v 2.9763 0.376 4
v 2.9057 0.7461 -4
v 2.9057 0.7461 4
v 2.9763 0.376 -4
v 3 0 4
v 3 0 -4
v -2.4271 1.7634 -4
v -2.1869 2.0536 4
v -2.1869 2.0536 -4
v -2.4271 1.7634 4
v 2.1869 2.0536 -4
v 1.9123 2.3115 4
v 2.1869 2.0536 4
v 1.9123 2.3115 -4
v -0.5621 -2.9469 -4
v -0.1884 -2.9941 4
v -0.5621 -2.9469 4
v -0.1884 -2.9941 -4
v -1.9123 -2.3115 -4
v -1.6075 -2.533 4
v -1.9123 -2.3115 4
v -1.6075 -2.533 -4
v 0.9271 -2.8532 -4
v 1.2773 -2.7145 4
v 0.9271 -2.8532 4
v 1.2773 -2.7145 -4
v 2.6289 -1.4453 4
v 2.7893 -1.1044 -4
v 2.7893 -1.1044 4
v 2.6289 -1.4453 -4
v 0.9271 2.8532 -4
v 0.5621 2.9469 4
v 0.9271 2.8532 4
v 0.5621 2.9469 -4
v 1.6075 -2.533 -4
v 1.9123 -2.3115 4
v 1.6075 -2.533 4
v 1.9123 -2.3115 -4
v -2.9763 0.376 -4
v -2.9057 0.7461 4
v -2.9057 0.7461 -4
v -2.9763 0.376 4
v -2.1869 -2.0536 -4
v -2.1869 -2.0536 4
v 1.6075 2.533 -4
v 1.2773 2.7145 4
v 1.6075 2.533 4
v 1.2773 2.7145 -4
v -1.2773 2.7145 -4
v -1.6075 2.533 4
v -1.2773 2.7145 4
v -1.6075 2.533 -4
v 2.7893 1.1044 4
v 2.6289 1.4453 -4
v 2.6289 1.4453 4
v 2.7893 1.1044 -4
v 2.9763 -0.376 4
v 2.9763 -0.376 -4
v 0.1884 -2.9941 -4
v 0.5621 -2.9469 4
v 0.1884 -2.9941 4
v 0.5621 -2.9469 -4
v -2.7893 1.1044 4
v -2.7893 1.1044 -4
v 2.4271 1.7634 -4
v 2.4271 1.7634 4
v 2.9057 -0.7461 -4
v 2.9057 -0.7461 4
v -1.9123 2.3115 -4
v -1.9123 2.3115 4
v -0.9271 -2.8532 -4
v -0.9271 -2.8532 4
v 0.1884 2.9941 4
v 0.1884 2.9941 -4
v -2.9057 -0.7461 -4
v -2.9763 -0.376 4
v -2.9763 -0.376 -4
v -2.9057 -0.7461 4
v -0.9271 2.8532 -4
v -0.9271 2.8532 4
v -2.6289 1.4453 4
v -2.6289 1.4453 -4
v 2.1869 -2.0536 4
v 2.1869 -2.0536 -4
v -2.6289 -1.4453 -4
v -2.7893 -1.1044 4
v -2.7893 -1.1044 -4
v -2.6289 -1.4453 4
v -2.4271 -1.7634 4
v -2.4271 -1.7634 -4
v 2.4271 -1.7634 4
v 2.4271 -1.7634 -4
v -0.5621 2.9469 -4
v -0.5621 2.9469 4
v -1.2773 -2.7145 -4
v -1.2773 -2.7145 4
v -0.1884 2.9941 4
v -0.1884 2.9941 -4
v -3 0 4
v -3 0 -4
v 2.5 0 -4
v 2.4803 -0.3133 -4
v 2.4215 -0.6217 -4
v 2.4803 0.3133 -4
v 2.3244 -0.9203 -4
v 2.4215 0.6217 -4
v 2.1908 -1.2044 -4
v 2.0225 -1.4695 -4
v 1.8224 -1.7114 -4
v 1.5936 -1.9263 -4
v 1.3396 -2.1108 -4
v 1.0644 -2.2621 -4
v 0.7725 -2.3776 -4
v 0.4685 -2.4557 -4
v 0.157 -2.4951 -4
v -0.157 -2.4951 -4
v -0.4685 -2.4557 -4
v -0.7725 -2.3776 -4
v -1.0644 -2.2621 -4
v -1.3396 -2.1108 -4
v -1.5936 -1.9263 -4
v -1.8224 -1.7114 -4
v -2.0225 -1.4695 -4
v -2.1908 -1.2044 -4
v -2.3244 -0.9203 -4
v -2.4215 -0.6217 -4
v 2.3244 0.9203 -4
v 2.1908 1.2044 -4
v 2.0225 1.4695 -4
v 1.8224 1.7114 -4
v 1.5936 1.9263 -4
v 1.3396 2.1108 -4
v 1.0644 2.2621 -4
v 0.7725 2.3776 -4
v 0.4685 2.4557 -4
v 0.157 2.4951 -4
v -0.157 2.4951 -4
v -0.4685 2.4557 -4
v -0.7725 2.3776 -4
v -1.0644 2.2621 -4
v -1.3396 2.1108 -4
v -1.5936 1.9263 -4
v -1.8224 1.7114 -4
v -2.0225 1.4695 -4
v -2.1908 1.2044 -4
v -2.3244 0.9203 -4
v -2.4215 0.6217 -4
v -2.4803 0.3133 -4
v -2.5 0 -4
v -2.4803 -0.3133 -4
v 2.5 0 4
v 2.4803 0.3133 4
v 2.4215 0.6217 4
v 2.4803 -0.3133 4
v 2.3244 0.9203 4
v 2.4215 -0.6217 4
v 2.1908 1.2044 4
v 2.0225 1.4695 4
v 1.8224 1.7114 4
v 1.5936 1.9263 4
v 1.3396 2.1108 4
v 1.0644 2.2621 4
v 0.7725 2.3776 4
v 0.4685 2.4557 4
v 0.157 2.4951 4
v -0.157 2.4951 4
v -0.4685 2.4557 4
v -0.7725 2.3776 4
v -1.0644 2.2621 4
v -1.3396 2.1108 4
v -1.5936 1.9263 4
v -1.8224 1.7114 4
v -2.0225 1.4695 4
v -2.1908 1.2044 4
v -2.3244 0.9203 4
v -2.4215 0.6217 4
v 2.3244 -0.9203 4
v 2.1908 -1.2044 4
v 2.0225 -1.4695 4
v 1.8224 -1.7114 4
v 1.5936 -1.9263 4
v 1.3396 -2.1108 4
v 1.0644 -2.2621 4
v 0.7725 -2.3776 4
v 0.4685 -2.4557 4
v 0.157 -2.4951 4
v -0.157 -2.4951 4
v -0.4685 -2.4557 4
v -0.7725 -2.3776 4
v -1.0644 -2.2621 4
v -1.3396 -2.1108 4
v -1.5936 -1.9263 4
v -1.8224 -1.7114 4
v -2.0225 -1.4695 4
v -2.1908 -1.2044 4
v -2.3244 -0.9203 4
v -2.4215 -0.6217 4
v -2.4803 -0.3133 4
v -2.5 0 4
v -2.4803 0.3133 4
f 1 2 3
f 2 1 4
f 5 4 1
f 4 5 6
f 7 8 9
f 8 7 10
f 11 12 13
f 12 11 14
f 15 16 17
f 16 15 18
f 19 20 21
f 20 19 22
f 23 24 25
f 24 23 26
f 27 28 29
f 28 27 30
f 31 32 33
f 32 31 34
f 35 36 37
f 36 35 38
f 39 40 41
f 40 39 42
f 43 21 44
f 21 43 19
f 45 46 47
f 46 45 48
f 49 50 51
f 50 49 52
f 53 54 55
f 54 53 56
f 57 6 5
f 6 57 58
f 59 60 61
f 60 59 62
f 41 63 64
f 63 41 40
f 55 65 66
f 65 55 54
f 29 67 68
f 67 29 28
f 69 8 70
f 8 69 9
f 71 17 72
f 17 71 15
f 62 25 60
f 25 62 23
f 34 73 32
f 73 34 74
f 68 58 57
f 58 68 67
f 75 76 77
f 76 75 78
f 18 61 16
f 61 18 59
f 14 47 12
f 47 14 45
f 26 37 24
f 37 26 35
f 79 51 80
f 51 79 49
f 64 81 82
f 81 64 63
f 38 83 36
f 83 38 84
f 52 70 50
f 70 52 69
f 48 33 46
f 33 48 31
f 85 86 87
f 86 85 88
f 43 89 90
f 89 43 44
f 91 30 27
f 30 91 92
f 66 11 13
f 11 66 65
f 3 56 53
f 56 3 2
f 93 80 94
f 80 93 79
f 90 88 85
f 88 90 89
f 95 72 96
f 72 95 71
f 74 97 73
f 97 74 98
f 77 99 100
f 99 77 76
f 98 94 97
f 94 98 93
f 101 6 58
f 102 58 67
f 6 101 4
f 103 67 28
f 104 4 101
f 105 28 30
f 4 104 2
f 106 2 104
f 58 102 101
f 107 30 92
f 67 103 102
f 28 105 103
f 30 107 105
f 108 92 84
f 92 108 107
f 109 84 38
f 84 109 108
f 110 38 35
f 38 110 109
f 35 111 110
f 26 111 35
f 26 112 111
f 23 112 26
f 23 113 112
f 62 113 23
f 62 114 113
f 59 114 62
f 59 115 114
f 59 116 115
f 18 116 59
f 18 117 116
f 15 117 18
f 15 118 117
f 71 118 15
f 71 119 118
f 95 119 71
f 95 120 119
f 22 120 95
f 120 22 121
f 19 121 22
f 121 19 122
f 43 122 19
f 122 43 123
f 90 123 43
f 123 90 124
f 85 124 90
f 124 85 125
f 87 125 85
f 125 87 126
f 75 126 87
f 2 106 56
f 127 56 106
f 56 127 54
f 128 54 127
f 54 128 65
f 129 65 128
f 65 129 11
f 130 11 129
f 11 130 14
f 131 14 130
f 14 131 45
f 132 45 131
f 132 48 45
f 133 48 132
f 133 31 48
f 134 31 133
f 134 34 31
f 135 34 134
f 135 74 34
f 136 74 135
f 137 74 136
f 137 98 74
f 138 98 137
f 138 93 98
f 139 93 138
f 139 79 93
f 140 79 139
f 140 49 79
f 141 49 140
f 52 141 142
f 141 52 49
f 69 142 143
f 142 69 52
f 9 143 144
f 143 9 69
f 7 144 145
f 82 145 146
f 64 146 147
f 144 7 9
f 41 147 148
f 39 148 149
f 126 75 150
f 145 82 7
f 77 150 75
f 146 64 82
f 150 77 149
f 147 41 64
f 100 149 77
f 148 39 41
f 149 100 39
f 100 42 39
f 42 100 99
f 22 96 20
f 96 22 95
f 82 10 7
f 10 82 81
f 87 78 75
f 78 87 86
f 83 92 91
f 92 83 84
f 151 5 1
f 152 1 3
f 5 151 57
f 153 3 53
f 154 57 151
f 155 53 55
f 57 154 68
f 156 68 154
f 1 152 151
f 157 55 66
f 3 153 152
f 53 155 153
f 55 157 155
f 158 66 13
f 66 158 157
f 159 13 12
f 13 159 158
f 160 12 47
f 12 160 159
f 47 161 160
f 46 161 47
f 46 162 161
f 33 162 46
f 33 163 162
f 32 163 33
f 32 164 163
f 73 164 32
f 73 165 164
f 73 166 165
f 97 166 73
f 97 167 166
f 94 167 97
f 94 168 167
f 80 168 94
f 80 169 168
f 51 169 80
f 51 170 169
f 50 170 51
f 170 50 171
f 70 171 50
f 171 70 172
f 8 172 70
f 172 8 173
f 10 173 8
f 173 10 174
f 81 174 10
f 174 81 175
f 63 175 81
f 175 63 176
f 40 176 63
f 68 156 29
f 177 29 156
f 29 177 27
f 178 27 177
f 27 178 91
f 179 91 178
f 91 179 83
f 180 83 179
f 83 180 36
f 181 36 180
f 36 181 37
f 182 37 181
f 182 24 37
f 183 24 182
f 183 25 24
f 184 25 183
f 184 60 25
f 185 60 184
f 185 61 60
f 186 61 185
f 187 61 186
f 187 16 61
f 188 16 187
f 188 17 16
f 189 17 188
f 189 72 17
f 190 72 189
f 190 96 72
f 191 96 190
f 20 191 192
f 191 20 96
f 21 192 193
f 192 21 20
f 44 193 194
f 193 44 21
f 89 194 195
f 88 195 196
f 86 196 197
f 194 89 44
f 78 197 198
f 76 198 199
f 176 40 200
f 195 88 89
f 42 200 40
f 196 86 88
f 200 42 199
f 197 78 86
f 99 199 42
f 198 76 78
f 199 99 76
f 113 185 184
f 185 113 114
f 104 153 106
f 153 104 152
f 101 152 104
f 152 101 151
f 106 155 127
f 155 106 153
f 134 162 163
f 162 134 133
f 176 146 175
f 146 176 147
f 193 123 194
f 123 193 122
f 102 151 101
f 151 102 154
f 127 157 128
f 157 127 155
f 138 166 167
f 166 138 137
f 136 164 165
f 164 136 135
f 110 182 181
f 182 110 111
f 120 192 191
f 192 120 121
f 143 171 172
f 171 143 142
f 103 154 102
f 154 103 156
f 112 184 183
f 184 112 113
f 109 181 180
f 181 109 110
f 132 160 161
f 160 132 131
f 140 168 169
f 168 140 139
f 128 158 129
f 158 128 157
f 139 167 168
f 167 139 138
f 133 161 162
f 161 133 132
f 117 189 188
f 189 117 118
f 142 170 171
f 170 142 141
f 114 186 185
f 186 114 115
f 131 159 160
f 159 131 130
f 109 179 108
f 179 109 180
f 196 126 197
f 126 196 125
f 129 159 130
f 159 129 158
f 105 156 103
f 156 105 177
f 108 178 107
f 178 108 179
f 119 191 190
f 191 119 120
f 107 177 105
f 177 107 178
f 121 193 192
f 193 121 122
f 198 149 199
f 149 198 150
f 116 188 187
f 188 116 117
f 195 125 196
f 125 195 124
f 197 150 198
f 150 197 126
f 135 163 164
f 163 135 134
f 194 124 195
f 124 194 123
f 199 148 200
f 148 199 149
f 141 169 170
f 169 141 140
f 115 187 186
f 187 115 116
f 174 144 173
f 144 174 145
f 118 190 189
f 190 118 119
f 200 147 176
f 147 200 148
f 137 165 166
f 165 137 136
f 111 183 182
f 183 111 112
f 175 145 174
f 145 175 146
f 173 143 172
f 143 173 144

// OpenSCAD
$fn = 50;


difference() {
	union() {
		translate(v = [0, 0, -4.0000000000]) {
			cylinder(h = 8, r = 3.0000000000);
		}
	}
	union() {
		translate(v = [0, 0, -100.0000000000]) {
			cylinder(h = 200, r = 2.5000000000);
		}
	}
}
